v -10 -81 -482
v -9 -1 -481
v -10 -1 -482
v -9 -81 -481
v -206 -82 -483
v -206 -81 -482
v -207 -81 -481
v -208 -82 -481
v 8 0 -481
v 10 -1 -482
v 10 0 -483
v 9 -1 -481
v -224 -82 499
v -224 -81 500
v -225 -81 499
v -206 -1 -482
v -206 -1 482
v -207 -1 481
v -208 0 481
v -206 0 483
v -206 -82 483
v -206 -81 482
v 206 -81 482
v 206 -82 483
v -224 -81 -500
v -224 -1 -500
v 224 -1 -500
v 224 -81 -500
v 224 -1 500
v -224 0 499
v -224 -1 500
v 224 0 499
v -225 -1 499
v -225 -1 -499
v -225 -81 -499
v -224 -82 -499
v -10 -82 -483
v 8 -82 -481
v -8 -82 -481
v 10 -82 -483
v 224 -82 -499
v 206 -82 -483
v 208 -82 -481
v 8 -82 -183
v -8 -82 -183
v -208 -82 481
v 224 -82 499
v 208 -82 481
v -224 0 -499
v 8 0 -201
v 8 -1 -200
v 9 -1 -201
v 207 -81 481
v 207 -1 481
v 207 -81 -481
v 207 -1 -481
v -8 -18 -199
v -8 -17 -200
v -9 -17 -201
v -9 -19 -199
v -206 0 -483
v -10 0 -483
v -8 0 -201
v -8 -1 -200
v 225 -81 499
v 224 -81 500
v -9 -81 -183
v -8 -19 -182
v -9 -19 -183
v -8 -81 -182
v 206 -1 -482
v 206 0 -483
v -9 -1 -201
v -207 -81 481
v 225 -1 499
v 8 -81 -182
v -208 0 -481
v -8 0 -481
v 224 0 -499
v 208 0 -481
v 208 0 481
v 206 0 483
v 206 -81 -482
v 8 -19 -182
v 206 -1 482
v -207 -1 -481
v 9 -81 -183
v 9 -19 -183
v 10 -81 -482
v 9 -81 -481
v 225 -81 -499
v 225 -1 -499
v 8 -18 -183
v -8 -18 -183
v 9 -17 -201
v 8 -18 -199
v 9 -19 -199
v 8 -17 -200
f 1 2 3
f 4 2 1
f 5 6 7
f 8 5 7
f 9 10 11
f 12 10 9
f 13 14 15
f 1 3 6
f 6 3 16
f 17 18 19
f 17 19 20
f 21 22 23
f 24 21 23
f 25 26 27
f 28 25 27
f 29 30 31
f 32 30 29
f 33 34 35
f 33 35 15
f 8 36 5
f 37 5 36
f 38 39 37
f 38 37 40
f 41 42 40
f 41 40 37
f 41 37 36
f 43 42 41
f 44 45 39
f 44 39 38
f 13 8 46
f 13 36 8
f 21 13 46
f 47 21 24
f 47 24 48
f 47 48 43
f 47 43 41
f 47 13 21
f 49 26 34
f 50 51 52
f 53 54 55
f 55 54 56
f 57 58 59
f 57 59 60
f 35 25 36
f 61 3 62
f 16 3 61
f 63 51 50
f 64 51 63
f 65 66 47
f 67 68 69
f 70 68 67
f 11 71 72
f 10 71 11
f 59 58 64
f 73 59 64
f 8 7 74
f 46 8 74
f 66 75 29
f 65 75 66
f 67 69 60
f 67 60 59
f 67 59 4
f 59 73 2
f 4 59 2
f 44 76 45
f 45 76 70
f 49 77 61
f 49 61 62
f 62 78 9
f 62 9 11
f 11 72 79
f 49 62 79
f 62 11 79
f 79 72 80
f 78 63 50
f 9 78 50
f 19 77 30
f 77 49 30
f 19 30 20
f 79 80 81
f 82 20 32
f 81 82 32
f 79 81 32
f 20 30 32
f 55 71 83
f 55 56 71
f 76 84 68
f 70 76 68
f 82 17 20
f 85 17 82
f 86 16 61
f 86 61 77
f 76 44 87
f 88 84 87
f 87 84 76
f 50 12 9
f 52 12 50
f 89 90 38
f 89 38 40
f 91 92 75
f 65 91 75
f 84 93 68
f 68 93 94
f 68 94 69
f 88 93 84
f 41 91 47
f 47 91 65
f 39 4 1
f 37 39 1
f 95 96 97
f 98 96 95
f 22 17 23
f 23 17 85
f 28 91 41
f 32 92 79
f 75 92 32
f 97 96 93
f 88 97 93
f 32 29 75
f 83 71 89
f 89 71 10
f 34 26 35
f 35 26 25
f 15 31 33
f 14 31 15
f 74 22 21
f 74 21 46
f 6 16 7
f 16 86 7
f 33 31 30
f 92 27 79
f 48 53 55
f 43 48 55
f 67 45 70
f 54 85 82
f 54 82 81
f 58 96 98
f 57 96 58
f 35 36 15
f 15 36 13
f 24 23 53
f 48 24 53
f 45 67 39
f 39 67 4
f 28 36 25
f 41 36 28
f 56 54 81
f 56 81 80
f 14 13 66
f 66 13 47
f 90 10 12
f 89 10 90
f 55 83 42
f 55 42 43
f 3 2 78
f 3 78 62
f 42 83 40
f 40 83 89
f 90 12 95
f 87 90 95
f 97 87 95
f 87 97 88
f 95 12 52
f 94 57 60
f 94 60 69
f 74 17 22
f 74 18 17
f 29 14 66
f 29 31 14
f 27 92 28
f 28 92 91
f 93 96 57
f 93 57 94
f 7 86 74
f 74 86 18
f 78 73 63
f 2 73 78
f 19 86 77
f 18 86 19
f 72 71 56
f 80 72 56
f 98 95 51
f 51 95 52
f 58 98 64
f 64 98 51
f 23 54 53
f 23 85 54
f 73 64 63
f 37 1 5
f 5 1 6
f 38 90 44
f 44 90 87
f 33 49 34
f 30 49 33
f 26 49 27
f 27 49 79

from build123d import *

# Parameters (mm, degrees)
F0_W     = 450
F0_H     = 1000
F1_DEPTH = 82
F2_W     = 18
F2_H     = 18
F3_DEPTH = 25
F4_SIZE  = 1


with BuildPart() as f1:
    # F0 (on Front) → F1 (new body)
    with BuildSketch(Plane.XZ):
        Rectangle(F0_W, F0_H)
        Polygon((-207, 482), (207, 482), (207, -482), (9, -482), (9, -182), (-9, -182), (-9, -482), (-207, -482), align=None, mode=Mode.SUBTRACT)
    extrude(amount=F1_DEPTH)

    # F2 (on face) → F3 (cut)
    with BuildSketch(Plane.YZ.offset(9)):
        with Locations((-9, -191)):
            Rectangle(F2_W, F2_H)
    extrude(amount=-F3_DEPTH, mode=Mode.SUBTRACT)

    # F4
    f4_edges = [f1.edges().sort_by_distance(p)[0] for p in [
        (0, -82, 500),
        (0, 0, -500),
        (-225, -41, 500),
        (225, -41, 500),
        (225, -41, -500),
        (9, -41, -482),
        (-207, -41, -482),
        (0, 0, 500),
        (9, -82, -332),
        (225, 0, 0),
        (-108, 0, -482),
        (225, -82, 0),
        (0, 0, 482),
        (108, 0, -482),
        (207, 0, 0),
        (9, -9, -200),
        (0, -82, -500),
        (-225, -41, -500),
        (207, -41, 482),
        (-207, -41, 482),
        (207, -41, -482),
        (-9, -41, -482),
        (0, 0, -200),
        (0, -18, -182),
        (-9, -82, -332),
        (0, -82, -182),
        (-225, 0, 0),
        (-225, -82, 0),
        (-108, -82, -482),
        (0, -18, -200),
        (0, -82, 482),
        (108, -82, -482),
        (207, -82, 0),
        (-207, 0, 0),
        (-207, -82, 0),
        (9, -18, -191),
        (-9, -9, -200),
        (-9, -18, -191),
        (-9, 0, -341),
        (9, 0, -341),
        (9, -50, -182),
        (-9, -50, -182),
    ]]
    chamfer(f4_edges, length=F4_SIZE)


solid = f1.part
